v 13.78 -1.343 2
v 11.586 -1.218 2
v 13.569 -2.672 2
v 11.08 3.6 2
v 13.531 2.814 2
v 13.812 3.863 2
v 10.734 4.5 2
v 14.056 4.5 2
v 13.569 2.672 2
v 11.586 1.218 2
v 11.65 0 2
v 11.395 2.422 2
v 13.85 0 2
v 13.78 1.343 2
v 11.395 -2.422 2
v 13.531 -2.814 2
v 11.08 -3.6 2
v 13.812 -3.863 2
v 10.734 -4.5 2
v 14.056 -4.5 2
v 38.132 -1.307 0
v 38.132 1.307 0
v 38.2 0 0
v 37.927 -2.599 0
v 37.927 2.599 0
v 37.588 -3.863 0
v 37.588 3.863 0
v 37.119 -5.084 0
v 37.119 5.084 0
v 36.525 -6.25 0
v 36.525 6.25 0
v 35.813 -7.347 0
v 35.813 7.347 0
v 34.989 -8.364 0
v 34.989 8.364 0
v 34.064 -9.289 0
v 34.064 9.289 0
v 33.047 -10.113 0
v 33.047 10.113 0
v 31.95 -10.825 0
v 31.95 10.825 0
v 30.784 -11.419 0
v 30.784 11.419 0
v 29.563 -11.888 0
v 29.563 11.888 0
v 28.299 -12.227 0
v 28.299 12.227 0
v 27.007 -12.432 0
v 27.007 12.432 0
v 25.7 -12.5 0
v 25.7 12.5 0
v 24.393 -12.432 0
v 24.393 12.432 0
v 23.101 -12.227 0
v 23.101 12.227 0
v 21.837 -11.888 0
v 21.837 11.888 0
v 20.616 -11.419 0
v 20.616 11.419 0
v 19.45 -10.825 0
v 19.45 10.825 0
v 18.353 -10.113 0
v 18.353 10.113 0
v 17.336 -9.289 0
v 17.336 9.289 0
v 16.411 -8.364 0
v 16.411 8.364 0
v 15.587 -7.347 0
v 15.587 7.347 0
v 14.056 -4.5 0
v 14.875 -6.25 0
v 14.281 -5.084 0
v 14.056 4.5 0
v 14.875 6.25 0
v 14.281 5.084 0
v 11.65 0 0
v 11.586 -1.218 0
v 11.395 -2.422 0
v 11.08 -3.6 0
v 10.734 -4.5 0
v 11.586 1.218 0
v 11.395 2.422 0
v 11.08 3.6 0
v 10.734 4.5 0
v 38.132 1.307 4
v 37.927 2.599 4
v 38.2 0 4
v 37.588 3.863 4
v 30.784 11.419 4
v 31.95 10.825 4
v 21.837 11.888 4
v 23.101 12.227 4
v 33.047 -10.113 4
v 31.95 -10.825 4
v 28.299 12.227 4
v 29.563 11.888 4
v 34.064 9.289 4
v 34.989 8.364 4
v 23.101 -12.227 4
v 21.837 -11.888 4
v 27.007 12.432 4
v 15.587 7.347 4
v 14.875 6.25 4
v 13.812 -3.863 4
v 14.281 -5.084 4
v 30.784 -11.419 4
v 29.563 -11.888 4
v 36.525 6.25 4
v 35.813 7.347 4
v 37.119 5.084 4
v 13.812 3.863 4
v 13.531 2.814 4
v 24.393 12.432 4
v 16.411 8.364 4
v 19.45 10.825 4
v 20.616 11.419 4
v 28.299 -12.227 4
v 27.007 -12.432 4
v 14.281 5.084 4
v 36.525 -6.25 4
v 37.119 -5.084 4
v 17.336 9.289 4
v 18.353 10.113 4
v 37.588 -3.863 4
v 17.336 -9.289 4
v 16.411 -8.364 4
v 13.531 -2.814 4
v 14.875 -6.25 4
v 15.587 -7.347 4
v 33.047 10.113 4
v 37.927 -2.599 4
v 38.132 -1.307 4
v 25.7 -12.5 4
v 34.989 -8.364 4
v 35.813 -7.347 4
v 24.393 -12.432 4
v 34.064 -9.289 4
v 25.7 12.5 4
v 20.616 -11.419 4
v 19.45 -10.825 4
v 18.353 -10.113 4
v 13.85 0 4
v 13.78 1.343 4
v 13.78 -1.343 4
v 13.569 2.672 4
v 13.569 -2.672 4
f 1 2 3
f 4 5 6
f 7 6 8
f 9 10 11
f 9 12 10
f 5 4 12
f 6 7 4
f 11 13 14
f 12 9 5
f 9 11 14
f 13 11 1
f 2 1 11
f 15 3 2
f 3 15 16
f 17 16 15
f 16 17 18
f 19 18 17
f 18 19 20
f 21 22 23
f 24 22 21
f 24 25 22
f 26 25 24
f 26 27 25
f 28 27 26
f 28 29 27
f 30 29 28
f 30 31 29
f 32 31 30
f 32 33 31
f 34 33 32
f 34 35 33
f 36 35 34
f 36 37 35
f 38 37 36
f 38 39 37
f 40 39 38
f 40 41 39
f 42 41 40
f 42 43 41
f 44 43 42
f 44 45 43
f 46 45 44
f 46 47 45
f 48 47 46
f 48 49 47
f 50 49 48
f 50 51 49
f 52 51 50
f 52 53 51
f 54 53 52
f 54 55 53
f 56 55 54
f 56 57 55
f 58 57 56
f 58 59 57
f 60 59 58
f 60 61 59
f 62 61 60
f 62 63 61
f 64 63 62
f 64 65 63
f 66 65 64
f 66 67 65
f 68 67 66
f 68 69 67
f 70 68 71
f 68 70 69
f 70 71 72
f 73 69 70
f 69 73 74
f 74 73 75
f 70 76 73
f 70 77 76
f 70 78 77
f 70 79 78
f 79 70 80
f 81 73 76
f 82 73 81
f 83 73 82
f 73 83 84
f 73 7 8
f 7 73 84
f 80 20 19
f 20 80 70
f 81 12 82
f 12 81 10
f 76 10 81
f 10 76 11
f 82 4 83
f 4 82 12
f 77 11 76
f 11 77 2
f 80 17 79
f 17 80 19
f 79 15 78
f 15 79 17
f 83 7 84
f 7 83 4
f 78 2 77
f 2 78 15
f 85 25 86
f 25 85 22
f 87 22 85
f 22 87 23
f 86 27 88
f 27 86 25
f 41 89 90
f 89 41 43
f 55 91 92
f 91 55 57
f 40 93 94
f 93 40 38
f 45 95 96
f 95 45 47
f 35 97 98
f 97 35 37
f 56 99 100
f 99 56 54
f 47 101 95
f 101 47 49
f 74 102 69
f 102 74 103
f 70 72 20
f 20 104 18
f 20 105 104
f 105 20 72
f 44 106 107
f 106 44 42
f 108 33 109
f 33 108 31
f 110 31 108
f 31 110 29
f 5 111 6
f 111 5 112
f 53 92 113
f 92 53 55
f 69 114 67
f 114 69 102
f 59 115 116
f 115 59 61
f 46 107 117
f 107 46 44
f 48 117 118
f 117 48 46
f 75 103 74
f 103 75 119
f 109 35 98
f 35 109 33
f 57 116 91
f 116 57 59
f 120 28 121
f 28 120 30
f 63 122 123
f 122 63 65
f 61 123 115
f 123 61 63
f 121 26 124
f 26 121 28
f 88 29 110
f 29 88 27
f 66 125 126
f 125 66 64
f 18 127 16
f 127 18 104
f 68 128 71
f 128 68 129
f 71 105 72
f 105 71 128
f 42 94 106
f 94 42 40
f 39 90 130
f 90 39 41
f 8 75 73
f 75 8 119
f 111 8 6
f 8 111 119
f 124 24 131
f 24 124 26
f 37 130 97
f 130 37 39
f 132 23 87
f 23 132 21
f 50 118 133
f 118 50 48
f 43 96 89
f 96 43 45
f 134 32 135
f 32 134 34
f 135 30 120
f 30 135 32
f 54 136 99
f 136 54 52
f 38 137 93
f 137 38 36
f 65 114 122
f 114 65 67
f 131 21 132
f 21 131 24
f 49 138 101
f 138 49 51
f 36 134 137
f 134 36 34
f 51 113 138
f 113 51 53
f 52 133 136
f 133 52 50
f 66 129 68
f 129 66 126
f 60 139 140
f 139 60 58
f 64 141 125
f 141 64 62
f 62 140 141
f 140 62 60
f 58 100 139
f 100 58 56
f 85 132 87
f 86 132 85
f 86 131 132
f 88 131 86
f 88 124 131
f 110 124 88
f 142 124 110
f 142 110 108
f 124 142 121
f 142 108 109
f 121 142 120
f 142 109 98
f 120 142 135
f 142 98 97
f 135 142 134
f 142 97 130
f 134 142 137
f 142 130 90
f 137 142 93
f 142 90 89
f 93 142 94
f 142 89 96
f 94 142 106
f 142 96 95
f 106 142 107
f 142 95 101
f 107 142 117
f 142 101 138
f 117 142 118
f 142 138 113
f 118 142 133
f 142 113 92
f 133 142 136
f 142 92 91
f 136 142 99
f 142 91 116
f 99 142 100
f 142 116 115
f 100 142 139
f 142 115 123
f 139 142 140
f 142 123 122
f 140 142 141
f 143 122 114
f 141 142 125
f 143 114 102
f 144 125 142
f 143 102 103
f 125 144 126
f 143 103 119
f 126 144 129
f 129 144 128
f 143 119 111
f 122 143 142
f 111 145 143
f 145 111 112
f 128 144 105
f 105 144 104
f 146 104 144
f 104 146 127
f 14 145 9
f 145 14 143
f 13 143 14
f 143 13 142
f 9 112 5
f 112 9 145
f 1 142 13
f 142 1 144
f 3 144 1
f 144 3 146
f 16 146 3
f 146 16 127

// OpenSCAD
// Wahoo Speed Candence Sensor Casing Tool

// casing measurements
d1=23.3;
d2=25.7;
case_thick=8.5;

// slot measurements to insert the tool 
thick=2;
wide=9;

$fn=60;
debug=0;

// the part that fits into the slot
difference() {
  translate([0,-wide/2,0])
    cube([25,wide,thick]);
  translate([0,0,-0.01]) {
    cylinder(h=thick+0.02,d=d1);    
  }
}
// handle
translate([d2,0,0]) {
  difference() {
    cylinder(h=thick*2,d=25);
    translate([-d2+1,0,0])
      cylinder(h=thick*2+0.2,d=d2);
    
  }
}

// drawthe sensor itself
if (debug) {
  #translate([0,0,-case_thick/2])
    hull() {
    cylinder(h=case_thick,d=d2);
    translate([-35+d2,0,0])
    cylinder(h=case_thick,d=d2);
  }
}
